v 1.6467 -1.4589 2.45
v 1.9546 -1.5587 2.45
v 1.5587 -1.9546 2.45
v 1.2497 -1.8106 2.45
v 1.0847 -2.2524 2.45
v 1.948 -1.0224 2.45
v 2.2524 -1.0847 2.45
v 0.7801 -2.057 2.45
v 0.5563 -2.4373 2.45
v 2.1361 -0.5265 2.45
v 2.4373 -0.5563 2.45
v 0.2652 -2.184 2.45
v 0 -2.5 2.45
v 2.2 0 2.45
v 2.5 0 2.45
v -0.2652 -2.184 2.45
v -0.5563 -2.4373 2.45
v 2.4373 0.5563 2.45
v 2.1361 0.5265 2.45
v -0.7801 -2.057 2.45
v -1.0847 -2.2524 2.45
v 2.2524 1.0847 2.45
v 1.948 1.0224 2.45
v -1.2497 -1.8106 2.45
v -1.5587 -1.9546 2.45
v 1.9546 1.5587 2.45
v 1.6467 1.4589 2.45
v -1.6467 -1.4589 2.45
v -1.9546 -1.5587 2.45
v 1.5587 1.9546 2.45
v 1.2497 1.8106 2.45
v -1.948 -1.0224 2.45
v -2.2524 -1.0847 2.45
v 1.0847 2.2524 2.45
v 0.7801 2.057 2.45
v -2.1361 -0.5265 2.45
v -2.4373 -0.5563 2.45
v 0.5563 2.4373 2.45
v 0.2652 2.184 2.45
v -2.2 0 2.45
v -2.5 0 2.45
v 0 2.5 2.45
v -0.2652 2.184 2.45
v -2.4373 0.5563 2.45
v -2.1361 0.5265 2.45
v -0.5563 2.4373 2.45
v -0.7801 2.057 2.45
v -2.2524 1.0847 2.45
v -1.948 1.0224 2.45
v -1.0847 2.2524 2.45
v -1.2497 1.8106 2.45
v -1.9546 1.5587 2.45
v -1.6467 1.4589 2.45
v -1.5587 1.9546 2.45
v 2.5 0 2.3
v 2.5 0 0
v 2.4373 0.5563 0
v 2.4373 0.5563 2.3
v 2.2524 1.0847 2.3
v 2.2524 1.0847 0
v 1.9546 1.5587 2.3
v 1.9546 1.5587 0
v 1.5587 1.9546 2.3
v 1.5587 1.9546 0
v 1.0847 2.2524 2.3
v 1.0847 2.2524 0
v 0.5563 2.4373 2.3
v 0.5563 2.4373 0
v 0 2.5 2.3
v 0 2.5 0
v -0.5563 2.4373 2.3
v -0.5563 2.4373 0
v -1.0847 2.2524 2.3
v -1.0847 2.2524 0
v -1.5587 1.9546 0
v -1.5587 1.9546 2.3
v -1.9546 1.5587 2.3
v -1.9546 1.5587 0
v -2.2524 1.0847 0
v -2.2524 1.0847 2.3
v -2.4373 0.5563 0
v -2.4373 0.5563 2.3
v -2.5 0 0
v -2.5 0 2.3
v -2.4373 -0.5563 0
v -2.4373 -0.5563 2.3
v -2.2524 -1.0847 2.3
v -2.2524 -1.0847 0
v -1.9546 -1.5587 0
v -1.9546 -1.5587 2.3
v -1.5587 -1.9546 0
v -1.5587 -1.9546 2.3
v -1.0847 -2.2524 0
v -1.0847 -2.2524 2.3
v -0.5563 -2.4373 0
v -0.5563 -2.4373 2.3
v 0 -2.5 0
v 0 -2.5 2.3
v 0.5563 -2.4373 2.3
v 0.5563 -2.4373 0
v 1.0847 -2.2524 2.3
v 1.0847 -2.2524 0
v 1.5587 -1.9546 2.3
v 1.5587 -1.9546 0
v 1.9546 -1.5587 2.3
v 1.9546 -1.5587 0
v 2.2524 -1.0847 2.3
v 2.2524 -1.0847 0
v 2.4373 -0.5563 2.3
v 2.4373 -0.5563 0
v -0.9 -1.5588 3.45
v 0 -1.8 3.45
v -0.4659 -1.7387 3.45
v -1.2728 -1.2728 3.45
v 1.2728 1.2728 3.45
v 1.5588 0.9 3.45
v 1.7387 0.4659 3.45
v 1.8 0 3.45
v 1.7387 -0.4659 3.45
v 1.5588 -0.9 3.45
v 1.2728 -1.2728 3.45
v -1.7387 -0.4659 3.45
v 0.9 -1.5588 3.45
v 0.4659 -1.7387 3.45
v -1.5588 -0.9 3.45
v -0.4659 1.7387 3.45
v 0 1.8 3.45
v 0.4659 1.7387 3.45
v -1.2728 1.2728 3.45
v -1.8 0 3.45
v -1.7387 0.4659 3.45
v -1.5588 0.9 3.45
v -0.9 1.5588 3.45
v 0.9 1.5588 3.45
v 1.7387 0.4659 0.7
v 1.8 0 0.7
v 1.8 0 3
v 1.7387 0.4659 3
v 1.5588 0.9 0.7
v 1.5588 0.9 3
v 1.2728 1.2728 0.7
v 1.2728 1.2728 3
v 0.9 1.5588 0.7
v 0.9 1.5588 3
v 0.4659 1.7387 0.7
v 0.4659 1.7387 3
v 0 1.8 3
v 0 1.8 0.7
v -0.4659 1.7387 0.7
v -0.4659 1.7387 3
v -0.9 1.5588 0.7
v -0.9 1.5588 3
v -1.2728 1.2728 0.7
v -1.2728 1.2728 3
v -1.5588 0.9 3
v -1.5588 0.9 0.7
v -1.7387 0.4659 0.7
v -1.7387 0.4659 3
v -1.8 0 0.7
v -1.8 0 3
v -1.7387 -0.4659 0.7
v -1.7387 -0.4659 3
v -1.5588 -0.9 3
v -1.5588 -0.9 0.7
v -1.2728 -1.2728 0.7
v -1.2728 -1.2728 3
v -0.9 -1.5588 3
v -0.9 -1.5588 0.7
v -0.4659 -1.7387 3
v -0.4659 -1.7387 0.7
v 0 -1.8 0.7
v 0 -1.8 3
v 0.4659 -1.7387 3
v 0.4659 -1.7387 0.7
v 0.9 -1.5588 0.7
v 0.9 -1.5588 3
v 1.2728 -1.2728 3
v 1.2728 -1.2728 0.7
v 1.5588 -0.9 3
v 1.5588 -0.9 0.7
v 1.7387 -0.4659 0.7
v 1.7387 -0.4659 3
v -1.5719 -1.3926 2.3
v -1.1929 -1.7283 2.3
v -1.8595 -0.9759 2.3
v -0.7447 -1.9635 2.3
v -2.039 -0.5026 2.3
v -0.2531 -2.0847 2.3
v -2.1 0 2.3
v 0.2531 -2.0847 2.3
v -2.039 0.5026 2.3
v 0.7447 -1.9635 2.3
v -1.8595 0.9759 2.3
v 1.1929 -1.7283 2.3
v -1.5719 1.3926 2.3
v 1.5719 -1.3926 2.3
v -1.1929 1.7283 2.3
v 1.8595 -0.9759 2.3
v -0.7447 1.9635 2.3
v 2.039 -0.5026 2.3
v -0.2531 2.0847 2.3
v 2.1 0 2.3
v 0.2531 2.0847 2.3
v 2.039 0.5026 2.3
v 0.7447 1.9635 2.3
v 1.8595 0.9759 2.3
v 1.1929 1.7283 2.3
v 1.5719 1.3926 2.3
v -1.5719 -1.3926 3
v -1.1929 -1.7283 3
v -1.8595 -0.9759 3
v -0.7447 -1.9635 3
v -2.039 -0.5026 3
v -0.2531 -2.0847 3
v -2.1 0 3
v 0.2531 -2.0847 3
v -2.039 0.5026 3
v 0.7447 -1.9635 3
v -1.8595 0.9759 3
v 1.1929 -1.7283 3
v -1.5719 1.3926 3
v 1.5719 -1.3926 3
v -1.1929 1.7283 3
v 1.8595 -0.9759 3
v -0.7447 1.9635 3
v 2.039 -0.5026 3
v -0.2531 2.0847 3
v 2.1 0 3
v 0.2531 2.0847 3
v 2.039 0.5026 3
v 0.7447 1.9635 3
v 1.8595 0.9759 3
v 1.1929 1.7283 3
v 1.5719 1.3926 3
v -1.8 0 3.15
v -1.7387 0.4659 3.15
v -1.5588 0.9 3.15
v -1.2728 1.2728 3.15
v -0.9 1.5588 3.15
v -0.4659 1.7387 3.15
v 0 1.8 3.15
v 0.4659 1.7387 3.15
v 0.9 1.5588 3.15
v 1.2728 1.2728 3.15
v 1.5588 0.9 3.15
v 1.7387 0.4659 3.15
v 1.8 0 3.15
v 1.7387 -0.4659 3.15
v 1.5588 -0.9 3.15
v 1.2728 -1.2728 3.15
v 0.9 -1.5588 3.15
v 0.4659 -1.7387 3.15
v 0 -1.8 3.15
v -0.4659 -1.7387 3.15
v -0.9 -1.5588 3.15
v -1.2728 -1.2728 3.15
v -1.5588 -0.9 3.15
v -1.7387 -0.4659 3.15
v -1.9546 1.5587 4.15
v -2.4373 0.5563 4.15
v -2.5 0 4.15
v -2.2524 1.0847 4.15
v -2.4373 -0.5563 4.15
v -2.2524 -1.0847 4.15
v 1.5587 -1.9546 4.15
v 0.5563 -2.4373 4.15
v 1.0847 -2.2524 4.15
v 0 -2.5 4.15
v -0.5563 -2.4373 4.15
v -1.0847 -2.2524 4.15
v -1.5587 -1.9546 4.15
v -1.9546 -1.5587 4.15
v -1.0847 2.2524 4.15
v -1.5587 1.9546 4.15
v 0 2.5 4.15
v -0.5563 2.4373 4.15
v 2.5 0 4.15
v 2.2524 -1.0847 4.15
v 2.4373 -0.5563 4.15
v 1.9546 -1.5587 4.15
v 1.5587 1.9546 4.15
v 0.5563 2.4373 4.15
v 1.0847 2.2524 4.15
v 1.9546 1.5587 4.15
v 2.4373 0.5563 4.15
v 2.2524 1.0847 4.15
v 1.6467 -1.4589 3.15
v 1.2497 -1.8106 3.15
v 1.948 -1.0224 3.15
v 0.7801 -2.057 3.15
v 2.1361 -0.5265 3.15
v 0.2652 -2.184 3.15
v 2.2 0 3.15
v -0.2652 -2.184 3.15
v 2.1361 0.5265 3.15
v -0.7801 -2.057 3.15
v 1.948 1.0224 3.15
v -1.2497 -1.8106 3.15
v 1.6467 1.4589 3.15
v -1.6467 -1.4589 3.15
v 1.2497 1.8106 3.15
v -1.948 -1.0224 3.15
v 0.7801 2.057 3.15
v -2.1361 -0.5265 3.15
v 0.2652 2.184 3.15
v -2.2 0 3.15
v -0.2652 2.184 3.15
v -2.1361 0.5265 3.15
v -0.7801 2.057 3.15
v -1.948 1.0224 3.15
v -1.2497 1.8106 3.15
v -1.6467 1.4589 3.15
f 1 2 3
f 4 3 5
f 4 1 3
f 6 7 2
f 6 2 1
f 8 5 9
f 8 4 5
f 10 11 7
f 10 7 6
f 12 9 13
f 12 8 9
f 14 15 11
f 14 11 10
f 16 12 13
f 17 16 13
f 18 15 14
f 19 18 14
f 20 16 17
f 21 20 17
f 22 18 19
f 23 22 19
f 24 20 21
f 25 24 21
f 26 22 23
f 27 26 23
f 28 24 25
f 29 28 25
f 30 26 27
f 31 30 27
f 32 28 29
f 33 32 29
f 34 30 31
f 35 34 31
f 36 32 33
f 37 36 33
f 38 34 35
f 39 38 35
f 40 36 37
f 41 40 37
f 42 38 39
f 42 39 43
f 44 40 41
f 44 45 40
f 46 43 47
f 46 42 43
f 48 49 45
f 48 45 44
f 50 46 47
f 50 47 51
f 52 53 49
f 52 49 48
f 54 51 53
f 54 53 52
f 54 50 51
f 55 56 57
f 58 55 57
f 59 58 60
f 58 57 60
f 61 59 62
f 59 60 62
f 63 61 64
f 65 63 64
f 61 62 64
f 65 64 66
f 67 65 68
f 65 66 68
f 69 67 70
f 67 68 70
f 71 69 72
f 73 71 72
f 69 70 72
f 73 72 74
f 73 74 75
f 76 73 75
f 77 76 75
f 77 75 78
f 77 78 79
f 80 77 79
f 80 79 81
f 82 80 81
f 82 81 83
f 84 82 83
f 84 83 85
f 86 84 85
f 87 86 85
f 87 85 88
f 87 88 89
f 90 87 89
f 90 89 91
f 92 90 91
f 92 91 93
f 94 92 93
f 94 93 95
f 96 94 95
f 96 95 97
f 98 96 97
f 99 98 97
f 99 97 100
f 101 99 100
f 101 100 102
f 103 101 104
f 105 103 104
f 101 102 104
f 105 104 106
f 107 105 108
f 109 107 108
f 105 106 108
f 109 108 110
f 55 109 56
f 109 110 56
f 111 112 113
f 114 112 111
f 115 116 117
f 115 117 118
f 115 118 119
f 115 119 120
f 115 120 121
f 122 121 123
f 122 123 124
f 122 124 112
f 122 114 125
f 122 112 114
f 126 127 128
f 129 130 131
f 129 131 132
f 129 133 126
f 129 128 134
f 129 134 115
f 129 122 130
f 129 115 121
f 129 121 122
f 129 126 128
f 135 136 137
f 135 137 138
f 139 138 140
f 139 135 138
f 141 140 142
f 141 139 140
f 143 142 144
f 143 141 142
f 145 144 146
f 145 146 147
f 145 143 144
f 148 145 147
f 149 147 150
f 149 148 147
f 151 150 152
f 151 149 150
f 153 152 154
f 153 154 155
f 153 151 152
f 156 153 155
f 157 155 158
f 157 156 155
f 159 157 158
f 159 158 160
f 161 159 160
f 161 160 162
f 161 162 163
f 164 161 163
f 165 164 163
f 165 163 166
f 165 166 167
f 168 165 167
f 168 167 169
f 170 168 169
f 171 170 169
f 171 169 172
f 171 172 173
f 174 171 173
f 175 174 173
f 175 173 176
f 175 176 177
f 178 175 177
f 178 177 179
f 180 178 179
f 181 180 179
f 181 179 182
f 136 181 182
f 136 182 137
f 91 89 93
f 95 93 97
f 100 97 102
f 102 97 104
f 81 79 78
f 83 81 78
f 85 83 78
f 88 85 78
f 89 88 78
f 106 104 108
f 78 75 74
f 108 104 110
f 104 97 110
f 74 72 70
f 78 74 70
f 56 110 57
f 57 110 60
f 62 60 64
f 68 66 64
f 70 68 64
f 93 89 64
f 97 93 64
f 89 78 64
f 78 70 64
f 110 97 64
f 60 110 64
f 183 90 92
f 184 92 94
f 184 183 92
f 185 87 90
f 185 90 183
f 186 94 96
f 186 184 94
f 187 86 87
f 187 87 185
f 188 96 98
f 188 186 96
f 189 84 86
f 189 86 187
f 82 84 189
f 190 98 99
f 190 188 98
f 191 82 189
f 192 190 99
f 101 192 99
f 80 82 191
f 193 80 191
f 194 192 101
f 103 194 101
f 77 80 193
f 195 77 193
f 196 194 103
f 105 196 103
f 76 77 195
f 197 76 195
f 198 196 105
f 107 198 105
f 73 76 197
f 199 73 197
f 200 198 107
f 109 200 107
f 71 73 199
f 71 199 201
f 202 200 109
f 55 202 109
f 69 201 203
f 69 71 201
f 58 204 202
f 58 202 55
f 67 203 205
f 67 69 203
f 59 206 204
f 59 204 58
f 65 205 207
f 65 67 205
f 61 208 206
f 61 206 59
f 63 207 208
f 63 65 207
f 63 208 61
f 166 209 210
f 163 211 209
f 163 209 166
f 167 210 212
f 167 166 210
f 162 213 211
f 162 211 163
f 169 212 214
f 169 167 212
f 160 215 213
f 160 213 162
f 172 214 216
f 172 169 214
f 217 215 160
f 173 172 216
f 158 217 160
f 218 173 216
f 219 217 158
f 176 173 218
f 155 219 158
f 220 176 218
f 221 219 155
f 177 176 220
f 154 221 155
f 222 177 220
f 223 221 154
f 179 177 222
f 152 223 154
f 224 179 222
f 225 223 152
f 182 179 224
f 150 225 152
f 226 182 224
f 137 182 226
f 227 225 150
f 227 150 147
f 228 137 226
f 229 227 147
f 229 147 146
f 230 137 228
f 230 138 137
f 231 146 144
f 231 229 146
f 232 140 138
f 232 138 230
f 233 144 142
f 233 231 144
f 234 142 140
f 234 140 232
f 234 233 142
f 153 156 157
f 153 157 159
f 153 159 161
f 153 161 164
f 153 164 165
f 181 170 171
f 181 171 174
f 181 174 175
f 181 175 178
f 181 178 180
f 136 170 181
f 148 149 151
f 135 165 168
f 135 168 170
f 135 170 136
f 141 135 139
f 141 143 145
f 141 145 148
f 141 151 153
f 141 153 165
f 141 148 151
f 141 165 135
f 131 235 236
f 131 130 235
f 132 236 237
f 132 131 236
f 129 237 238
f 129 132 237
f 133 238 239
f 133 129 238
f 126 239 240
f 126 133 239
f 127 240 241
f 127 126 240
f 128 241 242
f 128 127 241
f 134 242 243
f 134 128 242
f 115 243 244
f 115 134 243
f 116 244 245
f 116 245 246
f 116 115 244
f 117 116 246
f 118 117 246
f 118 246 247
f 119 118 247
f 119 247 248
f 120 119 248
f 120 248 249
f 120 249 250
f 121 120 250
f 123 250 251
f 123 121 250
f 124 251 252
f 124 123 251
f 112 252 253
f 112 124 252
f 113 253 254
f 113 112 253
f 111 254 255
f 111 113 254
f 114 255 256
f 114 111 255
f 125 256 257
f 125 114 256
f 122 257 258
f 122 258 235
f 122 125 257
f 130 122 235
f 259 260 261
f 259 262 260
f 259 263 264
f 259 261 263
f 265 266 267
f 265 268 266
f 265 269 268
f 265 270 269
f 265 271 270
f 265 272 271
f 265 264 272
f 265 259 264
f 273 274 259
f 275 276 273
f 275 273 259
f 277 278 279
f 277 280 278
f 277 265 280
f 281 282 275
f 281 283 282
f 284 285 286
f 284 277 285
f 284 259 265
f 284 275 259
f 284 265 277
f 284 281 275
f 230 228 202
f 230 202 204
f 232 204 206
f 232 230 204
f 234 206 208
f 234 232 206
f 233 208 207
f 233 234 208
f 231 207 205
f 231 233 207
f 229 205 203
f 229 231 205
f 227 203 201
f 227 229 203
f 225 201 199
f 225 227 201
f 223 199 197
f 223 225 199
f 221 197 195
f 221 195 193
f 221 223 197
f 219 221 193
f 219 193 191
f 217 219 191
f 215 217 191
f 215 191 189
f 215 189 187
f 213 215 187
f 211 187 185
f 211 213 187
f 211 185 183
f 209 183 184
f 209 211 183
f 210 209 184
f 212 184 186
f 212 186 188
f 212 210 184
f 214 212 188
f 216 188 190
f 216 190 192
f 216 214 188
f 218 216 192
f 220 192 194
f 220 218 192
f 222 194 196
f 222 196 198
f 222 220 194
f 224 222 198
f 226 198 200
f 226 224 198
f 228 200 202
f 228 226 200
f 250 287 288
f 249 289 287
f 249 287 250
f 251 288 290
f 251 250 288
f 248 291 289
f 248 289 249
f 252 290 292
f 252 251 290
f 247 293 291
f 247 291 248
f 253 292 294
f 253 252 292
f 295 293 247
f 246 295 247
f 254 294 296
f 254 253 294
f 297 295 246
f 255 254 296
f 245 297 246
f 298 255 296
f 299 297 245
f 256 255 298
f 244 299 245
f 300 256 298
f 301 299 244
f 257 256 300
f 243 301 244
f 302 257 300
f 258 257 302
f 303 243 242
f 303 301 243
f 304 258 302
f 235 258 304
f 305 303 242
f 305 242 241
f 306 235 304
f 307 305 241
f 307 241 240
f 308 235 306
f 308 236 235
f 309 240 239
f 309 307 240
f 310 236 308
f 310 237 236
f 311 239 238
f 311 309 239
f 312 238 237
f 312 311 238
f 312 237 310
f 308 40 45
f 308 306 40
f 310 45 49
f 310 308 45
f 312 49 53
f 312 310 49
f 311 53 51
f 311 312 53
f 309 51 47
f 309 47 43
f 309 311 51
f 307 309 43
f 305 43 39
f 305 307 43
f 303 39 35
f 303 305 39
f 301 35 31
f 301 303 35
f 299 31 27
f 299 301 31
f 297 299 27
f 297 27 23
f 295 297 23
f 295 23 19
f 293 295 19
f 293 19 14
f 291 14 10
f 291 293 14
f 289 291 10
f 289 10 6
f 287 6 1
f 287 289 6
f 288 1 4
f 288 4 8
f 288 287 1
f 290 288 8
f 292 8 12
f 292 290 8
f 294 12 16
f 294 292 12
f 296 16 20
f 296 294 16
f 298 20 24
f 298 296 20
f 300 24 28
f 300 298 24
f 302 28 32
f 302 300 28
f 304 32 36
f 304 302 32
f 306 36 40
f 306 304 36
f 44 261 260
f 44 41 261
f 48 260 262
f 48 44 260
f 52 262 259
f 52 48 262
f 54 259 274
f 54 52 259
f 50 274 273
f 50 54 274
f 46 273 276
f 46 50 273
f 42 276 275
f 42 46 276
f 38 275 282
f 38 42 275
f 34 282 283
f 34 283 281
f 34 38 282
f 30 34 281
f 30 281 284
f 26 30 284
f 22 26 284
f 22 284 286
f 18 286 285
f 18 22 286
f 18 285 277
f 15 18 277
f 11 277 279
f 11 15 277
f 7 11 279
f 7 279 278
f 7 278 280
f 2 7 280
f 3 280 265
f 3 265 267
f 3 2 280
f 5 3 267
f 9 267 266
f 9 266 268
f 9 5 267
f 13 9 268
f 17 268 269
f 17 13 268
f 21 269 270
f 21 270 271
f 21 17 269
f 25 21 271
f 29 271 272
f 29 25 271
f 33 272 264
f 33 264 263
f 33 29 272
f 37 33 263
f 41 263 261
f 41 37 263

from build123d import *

# Parameters (mm, degrees)
F0_R     = 2.5
F0_R_2   = 1.8
F1_DEPTH = 3
F2_DEPTH = 0.7
F3_R     = 2.5
F3_R_2   = 2.1
F4_DEPTH = 0.7


with BuildPart() as f1:
    # F0 (on Top) → F1 (new body)
    with BuildSketch(Plane.XY):
        Circle(F0_R)
        Circle(F0_R_2, mode=Mode.SUBTRACT)
    extrude(amount=F1_DEPTH)

    # F0 (on Top) → F2 (join)
    with BuildSketch(Plane.XY):
        Circle(F0_R_2)
    extrude(amount=F2_DEPTH)

    # F3 (on face) → F4 (cut)
    with BuildSketch(Plane.XY.offset(3)):
        Circle(F3_R)
        Circle(F3_R_2, mode=Mode.SUBTRACT)
    extrude(amount=-F4_DEPTH, mode=Mode.SUBTRACT)


with BuildPart() as f6:
    # F5 (on Front) → F6 (revolve)
    with BuildSketch(Plane.XZ):
        Polygon((-2.5, 4.15), (-2.5, 2.45), (-2.2, 2.45), (-2.2, 3.15), (-1.8, 3.15), (-1.8, 3.45), (0, 3.45), (0, 4.15), align=None)
    revolve(axis=Axis((0, 0, 2.075), (0, 0, -1)))


solid = Compound([f1.part, f6.part])
